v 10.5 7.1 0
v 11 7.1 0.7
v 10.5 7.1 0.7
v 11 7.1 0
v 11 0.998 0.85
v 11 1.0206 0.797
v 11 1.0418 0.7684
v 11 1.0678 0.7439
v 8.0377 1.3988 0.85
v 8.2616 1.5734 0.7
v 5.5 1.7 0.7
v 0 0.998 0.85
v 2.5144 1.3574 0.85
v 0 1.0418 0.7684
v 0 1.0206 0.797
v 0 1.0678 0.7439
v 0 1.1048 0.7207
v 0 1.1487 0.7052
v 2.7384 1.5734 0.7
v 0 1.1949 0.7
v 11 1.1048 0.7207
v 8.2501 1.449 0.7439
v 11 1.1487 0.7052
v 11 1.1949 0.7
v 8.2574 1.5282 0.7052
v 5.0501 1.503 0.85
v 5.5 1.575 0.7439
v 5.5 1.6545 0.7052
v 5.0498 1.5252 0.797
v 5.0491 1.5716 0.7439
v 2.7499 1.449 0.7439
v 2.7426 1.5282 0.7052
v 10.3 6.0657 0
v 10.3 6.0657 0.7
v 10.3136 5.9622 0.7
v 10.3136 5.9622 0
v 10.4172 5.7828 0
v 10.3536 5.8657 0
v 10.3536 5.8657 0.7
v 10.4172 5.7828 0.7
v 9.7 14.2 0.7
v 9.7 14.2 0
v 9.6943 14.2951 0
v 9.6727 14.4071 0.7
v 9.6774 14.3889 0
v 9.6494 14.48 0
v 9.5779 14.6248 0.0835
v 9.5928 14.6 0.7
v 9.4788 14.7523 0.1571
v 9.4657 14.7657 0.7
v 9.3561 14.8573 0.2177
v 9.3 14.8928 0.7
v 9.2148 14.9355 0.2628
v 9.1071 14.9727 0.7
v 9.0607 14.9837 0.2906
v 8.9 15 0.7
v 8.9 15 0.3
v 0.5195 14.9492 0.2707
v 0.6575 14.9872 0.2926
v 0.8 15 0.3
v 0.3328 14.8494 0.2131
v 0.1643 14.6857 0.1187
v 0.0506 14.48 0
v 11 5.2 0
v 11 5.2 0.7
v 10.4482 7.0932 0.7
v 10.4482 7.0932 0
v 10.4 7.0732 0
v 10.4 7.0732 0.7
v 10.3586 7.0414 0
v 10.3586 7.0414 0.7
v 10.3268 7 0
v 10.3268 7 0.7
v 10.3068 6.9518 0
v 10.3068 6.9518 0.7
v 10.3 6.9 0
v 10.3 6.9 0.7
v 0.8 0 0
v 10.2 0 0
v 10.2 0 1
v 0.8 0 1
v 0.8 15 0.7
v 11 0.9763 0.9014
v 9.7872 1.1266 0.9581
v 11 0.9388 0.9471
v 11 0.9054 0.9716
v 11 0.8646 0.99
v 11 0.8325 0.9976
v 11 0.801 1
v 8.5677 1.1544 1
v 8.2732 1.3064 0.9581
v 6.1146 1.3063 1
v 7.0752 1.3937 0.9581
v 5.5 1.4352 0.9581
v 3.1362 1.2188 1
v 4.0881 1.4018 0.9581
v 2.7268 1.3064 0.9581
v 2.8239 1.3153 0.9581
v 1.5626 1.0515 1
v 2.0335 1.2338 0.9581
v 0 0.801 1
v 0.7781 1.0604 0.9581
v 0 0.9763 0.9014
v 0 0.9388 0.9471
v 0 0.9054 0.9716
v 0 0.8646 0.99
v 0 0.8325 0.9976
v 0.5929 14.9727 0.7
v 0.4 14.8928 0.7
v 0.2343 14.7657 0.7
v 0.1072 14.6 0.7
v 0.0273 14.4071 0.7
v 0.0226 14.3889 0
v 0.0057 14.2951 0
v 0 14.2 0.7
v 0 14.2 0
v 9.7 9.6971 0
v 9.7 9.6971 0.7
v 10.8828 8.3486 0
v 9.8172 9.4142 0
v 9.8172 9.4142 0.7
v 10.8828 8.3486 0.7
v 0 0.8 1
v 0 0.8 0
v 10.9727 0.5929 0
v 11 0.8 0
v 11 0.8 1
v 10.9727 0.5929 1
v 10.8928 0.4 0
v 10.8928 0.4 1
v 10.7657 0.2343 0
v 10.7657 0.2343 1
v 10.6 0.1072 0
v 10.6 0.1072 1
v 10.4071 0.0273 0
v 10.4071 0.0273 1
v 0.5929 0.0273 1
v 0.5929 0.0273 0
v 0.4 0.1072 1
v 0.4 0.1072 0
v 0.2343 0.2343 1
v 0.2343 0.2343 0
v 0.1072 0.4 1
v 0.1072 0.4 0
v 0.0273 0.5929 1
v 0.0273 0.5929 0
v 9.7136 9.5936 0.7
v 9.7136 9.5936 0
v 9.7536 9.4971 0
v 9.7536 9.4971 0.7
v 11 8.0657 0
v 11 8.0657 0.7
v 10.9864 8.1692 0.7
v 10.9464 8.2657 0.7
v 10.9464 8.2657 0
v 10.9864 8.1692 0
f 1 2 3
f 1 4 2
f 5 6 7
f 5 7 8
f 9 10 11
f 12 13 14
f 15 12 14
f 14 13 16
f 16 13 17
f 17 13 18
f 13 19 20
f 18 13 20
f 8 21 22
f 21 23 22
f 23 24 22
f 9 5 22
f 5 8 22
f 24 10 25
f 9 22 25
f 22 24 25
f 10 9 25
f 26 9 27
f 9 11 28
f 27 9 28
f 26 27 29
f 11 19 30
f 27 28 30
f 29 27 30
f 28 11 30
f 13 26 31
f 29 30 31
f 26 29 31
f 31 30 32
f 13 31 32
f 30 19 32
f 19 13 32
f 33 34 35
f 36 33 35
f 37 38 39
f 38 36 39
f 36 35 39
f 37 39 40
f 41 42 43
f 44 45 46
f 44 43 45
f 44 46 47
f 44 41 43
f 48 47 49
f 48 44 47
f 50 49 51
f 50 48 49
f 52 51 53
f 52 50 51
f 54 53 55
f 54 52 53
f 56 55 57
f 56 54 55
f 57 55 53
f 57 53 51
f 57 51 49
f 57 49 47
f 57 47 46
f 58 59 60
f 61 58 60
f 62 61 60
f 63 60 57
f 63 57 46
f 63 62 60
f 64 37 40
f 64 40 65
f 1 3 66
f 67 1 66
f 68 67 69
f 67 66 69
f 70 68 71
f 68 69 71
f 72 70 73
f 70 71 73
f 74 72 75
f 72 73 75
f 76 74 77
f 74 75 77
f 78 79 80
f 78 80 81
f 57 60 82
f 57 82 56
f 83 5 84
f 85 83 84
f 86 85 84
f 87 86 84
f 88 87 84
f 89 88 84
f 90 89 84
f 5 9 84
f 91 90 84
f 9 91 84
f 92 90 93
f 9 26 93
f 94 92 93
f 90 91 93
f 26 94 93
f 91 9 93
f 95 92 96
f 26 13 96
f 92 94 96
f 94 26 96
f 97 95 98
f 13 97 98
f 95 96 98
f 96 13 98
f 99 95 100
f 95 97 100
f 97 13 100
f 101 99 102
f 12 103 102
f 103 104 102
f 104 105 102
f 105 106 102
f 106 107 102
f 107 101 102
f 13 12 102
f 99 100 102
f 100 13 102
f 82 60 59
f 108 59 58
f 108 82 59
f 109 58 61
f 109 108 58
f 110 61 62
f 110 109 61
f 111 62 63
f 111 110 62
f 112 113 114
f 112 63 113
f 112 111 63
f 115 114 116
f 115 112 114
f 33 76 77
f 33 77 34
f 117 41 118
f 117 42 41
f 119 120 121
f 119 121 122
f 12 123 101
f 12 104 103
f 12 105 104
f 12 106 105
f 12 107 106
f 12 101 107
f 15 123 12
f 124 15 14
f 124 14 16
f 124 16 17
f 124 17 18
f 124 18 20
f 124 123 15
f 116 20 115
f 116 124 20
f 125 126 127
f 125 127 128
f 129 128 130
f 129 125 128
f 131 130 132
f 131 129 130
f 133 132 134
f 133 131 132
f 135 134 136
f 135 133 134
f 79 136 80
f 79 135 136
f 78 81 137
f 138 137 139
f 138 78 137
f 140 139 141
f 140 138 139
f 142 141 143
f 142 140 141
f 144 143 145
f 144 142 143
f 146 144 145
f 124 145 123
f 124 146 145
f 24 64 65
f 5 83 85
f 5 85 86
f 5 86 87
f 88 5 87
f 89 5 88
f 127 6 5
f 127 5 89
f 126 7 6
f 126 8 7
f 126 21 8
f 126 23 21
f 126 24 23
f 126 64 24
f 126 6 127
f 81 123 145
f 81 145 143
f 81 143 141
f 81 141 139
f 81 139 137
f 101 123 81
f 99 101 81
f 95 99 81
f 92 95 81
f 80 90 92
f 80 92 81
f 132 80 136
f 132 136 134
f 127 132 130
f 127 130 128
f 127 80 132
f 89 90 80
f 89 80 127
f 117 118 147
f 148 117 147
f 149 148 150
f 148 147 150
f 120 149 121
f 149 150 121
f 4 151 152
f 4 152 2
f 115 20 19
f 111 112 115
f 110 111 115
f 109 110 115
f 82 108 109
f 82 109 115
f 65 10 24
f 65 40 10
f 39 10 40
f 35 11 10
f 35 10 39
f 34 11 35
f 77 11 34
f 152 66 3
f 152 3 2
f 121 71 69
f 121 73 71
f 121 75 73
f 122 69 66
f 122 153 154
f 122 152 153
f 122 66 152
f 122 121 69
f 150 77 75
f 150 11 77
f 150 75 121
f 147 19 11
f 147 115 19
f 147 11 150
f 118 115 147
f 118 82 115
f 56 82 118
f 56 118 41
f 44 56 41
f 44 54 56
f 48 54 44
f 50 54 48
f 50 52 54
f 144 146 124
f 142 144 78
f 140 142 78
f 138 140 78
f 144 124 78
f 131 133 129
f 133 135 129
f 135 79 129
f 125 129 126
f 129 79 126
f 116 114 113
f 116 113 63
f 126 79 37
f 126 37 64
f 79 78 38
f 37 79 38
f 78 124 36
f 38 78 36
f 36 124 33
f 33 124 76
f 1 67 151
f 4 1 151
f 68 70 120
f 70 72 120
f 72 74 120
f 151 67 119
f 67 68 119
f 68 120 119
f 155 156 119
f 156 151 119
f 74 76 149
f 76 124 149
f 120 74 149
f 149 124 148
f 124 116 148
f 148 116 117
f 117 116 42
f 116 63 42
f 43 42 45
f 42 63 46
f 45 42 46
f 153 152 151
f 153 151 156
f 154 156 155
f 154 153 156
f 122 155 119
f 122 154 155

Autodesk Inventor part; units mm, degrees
ref_plane "YZ Plane" through (0, 0, 0) normal (1, 0, 0) x (0, 1, 0)
ref_plane "XZ Plane" through (0, 0, 0) normal (0, 1, 0) x (-1, 0, 0)
ref_plane "XY Plane" through (0, 0, 0) normal (0, 0, 1) x (1, 0, 0)
sketch "Sketch1" plane through (0, 0, 0) normal (0, 0, 1) x (1, 0, 0)
  line L0 (0, 0) -> (0, 15)
  line L1 (0, 15) -> (9.7, 15)
  line L2 (9.7, 15) -> (9.7, 9.5314)
  line L3 (9.7, 9.5314) -> (11, 8.2314)
  line L4 (11, 8.2314) -> (11, 7.1)
  line L5 (11, 7.1) -> (10.3, 7.1)
  line L6 (10.3, 7.1) -> (10.3, 5.9)
  line L7 (10.3, 5.9) -> (11, 5.2)
  line L8 (11, 5.2) -> (11, 0)
  line L9 (11, 0) -> (0, 0)
  dimension "d0" = 11
  dimension "d1" = 15
  dimension "d2" = 135
  dimension "d5" = 9.7
  dimension "d6" = 1.2
  dimension "d7" = 0.7
  dimension "d8" = 0.8
  dimension "d9" = 7.9
  dimension "d11" = 0
extrude "Extrusion1" add sketch "Sketch1" along normal blind 0.7
fillet "Fillet1" radius 0.8 4 edges at (9.7, 15, 0.35) (0, 15, 0.35) (0, 0, 0.35) (11, 0, 0.35)
fillet "Fillet2" radius 0.4 3 edges at (9.7, 9.5314, 0.35) (11, 8.2314, 0.35) (10.3, 5.9, 0.35)
fillet "Fillet3" radius 0.2 1 edges at (10.3, 7.1, 0.35)
sketch "Sketch3" plane through (0, 0.8, 0) normal (-1, 0, 0) x (0, 0, 1)
  line L0 (0, 0) -> (0, 13.4) projected
  line L1 (0, 14.2) -> (0.3, 14.2)
  line L2 (0.3, 14.2) -> (0, 13.68)
  line L3 (0, 14.2) -> (0, 13.68)
  line L4 (0.7, 14.2) -> (0, 14.2) projected
  point P0 (0, -0.8)
  dimension "d17" = 0.52
  dimension "d18" = 0
  dimension "d19" = 0.3
extrude "Extrusion2" cut sketch "Sketch3" against normal through all
sketch "Sketch4" plane through (0, 0, 0.7) normal (0, 0, 1) x (1, 0, 0)
  line L0 (0, 0.8) -> (0, 14.2) projected
  arc A0 (0, 0.8) -> (0.8, 0) centre (0.8, 0.8) ccw projected
  line L1 (10.2, 0) -> (0.8, 0) projected
  arc A1 (10.2, 0) -> (11, 0.8) centre (10.2, 0.8) ccw projected
  line L2 (11, 5.2) -> (11, 0.8) projected
  arc A2 (11, 0.9915) -> (0, 0.9915) centre (5.5, -28.5) ccw
  point P0 (0, 0)
  dimension "d22" = 30
  dimension "d23" = 1.5
  dimension "d24" = 0.9915
  dimension "d25" = 0.9915
extrude "Extrusion3" add sketch "Sketch4" along normal blind 0.3
fillet "Fillet4" radius 0.2 2 edges at (5.5, 1.5, 0.7) (5.5, 1.5, 1)
equation "\"d24\" = d25"
